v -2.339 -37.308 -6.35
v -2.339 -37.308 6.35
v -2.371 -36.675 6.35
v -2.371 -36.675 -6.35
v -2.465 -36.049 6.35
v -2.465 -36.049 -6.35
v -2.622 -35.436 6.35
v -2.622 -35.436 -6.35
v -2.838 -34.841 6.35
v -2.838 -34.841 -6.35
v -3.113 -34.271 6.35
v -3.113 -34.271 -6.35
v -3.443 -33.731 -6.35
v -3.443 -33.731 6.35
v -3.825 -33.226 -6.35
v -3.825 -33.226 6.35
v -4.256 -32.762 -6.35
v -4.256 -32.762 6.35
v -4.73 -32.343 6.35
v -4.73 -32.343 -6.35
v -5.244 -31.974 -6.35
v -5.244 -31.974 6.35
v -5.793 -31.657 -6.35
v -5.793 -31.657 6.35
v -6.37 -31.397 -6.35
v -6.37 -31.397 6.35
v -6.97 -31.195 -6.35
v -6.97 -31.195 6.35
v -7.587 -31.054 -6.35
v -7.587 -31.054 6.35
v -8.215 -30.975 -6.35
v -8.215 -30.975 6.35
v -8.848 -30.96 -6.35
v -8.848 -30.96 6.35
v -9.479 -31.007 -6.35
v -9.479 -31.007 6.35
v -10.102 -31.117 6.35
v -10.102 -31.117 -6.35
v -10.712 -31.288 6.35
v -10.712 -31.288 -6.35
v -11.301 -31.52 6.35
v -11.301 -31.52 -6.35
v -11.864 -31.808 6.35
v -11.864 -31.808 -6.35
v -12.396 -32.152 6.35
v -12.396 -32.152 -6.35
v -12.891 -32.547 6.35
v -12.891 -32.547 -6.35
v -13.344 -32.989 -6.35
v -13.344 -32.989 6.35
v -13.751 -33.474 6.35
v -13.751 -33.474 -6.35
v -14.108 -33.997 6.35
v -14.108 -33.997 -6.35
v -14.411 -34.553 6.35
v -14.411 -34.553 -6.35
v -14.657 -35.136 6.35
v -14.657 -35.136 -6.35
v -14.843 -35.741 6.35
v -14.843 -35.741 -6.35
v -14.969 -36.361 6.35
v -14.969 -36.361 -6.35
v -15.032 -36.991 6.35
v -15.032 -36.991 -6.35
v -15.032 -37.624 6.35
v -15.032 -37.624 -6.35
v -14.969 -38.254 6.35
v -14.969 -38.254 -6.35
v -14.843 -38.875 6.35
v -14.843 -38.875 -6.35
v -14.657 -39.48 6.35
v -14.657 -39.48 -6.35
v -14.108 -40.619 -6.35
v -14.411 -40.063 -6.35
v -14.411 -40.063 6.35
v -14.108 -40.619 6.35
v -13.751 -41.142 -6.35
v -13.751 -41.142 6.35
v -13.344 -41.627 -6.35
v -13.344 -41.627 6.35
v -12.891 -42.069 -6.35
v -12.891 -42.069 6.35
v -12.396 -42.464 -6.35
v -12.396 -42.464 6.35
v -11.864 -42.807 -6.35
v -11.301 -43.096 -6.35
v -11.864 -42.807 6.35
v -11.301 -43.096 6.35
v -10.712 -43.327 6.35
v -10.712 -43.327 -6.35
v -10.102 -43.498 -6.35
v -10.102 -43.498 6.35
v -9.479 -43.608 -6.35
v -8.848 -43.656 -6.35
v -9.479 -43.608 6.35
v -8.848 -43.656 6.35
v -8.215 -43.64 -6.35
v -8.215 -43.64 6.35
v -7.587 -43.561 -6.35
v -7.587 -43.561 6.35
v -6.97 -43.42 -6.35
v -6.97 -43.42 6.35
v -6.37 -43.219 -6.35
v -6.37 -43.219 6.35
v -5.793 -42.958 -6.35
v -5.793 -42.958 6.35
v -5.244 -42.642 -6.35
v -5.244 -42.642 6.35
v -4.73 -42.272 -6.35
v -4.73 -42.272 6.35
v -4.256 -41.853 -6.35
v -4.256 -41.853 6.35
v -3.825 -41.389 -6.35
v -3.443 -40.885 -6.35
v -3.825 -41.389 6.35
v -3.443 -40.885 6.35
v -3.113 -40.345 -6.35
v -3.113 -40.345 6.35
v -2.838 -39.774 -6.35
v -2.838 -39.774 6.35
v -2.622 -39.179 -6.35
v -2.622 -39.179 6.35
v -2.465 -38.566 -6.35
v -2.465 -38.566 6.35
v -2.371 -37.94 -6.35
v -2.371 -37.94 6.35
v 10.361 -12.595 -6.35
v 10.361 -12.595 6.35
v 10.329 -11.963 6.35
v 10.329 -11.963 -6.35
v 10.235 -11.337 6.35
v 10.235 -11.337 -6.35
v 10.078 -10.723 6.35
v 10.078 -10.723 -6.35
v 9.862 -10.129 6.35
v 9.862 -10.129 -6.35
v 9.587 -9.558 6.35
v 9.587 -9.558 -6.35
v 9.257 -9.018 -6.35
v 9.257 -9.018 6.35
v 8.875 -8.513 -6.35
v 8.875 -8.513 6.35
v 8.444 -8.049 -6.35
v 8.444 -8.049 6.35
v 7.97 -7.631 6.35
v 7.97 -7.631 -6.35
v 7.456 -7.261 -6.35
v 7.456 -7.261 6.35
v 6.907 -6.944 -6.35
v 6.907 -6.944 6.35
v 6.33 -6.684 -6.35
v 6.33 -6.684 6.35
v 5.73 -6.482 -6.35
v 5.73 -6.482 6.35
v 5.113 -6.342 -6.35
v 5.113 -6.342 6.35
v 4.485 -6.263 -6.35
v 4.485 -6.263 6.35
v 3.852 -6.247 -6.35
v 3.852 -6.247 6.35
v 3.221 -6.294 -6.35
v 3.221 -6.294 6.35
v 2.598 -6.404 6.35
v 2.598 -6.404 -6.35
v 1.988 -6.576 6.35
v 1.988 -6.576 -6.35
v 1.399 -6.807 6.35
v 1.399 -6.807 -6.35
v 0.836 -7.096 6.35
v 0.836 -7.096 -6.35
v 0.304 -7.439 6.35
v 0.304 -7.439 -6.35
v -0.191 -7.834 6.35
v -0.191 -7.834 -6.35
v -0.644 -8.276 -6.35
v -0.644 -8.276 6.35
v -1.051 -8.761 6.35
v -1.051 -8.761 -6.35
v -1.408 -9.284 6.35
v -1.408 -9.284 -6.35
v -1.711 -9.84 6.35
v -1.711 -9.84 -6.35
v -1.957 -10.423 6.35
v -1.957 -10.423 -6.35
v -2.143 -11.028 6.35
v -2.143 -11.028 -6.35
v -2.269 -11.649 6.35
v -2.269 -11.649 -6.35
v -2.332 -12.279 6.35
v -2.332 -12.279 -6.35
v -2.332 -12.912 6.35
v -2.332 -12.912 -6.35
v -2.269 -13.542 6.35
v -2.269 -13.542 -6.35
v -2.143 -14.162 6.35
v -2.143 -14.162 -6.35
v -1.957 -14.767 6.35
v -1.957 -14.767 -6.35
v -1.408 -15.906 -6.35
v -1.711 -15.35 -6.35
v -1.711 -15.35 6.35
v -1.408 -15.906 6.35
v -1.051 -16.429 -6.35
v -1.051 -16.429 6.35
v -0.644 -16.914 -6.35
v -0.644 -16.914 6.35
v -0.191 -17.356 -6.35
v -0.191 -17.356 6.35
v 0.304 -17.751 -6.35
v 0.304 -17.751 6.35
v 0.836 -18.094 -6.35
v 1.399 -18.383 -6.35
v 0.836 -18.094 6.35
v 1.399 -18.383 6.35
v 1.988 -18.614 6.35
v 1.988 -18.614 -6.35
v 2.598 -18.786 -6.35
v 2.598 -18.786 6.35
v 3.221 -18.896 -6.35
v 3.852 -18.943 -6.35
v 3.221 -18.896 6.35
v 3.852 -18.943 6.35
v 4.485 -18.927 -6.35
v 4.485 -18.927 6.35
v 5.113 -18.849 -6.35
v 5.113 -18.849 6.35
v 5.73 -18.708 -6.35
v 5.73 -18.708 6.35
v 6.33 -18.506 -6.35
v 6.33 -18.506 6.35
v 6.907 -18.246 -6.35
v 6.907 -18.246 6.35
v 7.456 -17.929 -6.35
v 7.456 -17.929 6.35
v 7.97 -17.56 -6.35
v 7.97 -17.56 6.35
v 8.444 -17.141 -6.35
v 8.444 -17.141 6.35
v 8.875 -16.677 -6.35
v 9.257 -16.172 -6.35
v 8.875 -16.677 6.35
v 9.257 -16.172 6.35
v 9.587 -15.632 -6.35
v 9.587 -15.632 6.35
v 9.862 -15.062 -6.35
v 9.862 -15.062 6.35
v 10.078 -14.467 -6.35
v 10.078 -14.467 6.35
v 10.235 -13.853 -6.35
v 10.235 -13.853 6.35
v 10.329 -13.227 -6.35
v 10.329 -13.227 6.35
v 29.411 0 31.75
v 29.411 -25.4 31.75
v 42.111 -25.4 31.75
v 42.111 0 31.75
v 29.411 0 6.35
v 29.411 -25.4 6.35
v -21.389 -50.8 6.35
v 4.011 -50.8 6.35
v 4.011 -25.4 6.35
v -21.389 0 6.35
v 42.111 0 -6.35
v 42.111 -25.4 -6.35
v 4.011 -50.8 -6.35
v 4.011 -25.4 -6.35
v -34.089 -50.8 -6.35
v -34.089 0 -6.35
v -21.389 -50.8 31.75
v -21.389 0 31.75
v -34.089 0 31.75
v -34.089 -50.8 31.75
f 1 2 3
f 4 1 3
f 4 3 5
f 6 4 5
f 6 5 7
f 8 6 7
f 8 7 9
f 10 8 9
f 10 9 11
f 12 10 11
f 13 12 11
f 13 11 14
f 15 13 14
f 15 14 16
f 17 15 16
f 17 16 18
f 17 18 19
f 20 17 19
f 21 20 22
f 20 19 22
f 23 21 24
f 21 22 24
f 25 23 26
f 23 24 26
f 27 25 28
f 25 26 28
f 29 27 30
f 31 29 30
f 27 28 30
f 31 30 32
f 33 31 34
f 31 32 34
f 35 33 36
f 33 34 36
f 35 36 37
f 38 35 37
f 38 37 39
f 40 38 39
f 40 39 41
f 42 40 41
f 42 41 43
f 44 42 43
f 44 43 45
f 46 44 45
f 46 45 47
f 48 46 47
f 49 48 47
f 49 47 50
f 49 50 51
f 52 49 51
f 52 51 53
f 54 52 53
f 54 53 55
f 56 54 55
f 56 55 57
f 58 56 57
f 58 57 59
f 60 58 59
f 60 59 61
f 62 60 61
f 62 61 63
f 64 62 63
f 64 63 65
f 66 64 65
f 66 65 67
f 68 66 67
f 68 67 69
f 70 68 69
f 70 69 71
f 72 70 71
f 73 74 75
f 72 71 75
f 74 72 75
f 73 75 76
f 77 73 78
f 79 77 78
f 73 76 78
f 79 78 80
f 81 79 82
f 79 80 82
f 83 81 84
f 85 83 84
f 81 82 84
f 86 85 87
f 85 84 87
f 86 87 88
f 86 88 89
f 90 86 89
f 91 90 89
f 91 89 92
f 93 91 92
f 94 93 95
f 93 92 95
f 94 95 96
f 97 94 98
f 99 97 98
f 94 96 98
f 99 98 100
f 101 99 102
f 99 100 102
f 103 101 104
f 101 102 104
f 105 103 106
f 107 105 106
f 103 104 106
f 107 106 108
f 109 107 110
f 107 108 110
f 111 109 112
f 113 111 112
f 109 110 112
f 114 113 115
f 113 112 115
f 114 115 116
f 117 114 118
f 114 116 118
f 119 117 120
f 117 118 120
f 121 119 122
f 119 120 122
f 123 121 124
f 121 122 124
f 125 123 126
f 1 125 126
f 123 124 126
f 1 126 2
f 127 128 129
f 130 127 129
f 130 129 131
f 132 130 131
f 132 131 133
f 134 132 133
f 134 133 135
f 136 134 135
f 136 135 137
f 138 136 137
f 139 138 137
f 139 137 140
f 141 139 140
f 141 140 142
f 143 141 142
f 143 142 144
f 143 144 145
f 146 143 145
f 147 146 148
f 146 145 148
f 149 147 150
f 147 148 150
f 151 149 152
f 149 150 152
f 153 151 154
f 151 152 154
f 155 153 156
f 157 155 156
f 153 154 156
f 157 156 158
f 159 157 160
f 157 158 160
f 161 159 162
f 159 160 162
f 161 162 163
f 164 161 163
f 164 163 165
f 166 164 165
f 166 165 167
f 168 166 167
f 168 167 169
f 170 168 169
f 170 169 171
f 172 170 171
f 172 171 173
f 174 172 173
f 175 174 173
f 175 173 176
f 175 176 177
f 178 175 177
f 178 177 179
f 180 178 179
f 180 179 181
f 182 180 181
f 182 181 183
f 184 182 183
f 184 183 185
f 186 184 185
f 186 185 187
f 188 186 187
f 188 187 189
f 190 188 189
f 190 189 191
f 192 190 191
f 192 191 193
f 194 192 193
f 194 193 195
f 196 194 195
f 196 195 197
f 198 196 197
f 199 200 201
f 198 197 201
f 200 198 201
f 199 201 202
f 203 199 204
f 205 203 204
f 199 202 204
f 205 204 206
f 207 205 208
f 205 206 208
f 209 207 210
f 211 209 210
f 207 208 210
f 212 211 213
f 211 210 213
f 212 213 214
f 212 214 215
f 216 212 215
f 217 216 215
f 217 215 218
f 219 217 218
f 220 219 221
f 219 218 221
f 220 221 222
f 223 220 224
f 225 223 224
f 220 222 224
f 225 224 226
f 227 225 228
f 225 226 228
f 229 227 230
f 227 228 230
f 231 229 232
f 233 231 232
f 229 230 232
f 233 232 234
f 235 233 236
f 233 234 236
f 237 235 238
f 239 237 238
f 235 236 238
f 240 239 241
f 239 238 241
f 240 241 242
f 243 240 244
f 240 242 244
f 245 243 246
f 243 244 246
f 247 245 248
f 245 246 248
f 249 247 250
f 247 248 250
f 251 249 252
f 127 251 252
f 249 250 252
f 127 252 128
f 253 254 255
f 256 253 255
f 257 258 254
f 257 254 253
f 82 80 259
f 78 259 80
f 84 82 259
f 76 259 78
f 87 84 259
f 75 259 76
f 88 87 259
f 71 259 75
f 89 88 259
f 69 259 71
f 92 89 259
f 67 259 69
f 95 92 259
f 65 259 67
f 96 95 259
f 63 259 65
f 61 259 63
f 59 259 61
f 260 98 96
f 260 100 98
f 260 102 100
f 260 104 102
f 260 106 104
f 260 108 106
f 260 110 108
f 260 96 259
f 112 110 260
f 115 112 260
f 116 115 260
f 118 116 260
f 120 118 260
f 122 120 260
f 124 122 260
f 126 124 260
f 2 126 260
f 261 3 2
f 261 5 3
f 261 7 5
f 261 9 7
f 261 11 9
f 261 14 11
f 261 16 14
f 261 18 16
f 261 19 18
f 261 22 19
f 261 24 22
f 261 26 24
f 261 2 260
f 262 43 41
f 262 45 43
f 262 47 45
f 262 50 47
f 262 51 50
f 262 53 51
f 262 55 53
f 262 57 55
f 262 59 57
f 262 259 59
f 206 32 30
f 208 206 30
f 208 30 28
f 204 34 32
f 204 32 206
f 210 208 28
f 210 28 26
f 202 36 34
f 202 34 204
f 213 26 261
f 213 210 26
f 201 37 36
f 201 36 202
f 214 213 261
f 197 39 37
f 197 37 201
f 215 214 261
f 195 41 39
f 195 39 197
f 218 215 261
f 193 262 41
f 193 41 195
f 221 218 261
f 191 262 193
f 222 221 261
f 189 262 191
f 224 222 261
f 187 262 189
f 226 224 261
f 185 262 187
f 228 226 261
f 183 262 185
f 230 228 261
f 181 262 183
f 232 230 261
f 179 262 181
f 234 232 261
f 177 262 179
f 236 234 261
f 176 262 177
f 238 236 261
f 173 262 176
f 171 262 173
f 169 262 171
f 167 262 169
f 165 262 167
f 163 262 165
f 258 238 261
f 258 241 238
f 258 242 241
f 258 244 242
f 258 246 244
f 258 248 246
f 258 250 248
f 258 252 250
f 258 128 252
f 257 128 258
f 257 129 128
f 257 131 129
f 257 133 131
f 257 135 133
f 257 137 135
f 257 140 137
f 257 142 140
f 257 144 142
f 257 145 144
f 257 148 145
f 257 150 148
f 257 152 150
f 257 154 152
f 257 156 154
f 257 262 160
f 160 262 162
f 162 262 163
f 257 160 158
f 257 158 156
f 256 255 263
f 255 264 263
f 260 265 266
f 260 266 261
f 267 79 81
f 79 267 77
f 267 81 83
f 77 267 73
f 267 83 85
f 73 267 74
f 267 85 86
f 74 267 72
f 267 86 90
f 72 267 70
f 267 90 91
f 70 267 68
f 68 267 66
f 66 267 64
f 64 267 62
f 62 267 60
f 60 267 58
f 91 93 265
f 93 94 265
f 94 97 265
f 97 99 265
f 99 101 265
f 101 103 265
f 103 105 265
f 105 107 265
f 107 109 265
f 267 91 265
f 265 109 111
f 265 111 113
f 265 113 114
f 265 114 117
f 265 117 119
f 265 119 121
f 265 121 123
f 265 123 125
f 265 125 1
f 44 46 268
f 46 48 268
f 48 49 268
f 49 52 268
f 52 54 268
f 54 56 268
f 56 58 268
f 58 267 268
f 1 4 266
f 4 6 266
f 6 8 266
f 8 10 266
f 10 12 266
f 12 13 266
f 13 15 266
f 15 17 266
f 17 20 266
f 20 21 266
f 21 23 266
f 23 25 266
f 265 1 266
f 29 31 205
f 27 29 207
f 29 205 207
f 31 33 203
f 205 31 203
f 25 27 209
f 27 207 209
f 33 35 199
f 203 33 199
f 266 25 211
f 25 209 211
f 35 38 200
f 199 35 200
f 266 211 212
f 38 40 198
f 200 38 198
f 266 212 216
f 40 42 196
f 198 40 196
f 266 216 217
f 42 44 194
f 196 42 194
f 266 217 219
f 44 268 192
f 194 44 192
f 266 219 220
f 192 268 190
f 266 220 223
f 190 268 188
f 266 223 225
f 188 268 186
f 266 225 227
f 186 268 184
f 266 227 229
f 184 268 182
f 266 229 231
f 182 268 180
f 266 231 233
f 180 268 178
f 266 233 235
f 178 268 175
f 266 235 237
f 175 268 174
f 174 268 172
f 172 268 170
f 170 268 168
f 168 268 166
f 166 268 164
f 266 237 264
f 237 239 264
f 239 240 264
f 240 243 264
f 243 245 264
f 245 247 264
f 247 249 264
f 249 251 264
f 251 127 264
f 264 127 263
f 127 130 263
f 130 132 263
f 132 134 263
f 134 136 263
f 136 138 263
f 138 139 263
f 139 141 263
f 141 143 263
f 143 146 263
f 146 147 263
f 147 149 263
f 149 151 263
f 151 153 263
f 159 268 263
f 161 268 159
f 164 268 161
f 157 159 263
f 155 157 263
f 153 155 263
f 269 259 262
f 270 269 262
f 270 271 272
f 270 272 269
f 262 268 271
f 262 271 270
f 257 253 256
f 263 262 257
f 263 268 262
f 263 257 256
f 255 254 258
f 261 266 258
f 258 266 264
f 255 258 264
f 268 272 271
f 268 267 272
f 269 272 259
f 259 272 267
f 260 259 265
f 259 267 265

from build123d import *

# Parameters (mm, degrees)
F0_W      = 76.2
F0_H      = 12.7
F1_DEPTH  = 25.4
F3_DEPTH  = 50.8
F4_W      = 38.1
F4_H      = 12.7
F5_DEPTH  = 25.4
F6_W      = 12.7
F6_H      = 25.4
F7_DEPTH  = 25.4
F8_W      = 12.7
F8_H      = 50.8
F9_DEPTH  = 25.4
F10_R     = 6.35
F11_DEPTH = 25.4
F12_R     = 6.35
F13_DEPTH = 25.4


# Not quite as in the source:
# - a feature of the source that left no trace in its solid (it failed there, or was rolled back) is left out


with BuildPart() as f1:
    # F0 (on Front) → F1 (new body)
    with BuildSketch(Plane.XZ):
        with Locations((4.0105291711, 0)):
            Rectangle(F0_W, F0_H)
    extrude(amount=F1_DEPTH)

    # F0 (on Front) → F3 (join)
    with BuildSketch(Plane.XZ):
        with Locations((4.0105291711, 0)):
            Rectangle(F0_W, F0_H)
    extrude(amount=F3_DEPTH)

    # F4 (on face) → F5 (cut)
    with BuildSketch(Plane.XZ.offset(50.8)):
        with Locations((23.0605291711, 0)):
            Rectangle(F4_W, F4_H)
    extrude(amount=-F5_DEPTH, mode=Mode.SUBTRACT)

    # F6 (on face) → F7 (join)
    with BuildSketch(Plane.XY.offset(6.35)):
        with Locations((35.7605291711, -12.7)):
            Rectangle(F6_W, F6_H)
    extrude(amount=F7_DEPTH)

    # F8 (on face) → F9 (join)
    with BuildSketch(Plane.XY.offset(6.35)):
        with Locations((-27.7394708289, -25.4)):
            Rectangle(F8_W, F8_H)
    extrude(amount=F9_DEPTH)

    # F10 (on face) → F11 (cut)
    with BuildSketch(Plane.XY.offset(6.35)):
        with Locations((-8.6894708289, -37.3077057302)):
            Circle(F10_R)
    extrude(amount=-F11_DEPTH, mode=Mode.SUBTRACT)

    # F12 (on face) → F13 (cut)
    with BuildSketch(Plane.XY.offset(6.35)):
        with Locations((4.0105291711, -12.5951375812)):
            Circle(F12_R)
    extrude(amount=-F13_DEPTH, mode=Mode.SUBTRACT)


solid = f1.part
